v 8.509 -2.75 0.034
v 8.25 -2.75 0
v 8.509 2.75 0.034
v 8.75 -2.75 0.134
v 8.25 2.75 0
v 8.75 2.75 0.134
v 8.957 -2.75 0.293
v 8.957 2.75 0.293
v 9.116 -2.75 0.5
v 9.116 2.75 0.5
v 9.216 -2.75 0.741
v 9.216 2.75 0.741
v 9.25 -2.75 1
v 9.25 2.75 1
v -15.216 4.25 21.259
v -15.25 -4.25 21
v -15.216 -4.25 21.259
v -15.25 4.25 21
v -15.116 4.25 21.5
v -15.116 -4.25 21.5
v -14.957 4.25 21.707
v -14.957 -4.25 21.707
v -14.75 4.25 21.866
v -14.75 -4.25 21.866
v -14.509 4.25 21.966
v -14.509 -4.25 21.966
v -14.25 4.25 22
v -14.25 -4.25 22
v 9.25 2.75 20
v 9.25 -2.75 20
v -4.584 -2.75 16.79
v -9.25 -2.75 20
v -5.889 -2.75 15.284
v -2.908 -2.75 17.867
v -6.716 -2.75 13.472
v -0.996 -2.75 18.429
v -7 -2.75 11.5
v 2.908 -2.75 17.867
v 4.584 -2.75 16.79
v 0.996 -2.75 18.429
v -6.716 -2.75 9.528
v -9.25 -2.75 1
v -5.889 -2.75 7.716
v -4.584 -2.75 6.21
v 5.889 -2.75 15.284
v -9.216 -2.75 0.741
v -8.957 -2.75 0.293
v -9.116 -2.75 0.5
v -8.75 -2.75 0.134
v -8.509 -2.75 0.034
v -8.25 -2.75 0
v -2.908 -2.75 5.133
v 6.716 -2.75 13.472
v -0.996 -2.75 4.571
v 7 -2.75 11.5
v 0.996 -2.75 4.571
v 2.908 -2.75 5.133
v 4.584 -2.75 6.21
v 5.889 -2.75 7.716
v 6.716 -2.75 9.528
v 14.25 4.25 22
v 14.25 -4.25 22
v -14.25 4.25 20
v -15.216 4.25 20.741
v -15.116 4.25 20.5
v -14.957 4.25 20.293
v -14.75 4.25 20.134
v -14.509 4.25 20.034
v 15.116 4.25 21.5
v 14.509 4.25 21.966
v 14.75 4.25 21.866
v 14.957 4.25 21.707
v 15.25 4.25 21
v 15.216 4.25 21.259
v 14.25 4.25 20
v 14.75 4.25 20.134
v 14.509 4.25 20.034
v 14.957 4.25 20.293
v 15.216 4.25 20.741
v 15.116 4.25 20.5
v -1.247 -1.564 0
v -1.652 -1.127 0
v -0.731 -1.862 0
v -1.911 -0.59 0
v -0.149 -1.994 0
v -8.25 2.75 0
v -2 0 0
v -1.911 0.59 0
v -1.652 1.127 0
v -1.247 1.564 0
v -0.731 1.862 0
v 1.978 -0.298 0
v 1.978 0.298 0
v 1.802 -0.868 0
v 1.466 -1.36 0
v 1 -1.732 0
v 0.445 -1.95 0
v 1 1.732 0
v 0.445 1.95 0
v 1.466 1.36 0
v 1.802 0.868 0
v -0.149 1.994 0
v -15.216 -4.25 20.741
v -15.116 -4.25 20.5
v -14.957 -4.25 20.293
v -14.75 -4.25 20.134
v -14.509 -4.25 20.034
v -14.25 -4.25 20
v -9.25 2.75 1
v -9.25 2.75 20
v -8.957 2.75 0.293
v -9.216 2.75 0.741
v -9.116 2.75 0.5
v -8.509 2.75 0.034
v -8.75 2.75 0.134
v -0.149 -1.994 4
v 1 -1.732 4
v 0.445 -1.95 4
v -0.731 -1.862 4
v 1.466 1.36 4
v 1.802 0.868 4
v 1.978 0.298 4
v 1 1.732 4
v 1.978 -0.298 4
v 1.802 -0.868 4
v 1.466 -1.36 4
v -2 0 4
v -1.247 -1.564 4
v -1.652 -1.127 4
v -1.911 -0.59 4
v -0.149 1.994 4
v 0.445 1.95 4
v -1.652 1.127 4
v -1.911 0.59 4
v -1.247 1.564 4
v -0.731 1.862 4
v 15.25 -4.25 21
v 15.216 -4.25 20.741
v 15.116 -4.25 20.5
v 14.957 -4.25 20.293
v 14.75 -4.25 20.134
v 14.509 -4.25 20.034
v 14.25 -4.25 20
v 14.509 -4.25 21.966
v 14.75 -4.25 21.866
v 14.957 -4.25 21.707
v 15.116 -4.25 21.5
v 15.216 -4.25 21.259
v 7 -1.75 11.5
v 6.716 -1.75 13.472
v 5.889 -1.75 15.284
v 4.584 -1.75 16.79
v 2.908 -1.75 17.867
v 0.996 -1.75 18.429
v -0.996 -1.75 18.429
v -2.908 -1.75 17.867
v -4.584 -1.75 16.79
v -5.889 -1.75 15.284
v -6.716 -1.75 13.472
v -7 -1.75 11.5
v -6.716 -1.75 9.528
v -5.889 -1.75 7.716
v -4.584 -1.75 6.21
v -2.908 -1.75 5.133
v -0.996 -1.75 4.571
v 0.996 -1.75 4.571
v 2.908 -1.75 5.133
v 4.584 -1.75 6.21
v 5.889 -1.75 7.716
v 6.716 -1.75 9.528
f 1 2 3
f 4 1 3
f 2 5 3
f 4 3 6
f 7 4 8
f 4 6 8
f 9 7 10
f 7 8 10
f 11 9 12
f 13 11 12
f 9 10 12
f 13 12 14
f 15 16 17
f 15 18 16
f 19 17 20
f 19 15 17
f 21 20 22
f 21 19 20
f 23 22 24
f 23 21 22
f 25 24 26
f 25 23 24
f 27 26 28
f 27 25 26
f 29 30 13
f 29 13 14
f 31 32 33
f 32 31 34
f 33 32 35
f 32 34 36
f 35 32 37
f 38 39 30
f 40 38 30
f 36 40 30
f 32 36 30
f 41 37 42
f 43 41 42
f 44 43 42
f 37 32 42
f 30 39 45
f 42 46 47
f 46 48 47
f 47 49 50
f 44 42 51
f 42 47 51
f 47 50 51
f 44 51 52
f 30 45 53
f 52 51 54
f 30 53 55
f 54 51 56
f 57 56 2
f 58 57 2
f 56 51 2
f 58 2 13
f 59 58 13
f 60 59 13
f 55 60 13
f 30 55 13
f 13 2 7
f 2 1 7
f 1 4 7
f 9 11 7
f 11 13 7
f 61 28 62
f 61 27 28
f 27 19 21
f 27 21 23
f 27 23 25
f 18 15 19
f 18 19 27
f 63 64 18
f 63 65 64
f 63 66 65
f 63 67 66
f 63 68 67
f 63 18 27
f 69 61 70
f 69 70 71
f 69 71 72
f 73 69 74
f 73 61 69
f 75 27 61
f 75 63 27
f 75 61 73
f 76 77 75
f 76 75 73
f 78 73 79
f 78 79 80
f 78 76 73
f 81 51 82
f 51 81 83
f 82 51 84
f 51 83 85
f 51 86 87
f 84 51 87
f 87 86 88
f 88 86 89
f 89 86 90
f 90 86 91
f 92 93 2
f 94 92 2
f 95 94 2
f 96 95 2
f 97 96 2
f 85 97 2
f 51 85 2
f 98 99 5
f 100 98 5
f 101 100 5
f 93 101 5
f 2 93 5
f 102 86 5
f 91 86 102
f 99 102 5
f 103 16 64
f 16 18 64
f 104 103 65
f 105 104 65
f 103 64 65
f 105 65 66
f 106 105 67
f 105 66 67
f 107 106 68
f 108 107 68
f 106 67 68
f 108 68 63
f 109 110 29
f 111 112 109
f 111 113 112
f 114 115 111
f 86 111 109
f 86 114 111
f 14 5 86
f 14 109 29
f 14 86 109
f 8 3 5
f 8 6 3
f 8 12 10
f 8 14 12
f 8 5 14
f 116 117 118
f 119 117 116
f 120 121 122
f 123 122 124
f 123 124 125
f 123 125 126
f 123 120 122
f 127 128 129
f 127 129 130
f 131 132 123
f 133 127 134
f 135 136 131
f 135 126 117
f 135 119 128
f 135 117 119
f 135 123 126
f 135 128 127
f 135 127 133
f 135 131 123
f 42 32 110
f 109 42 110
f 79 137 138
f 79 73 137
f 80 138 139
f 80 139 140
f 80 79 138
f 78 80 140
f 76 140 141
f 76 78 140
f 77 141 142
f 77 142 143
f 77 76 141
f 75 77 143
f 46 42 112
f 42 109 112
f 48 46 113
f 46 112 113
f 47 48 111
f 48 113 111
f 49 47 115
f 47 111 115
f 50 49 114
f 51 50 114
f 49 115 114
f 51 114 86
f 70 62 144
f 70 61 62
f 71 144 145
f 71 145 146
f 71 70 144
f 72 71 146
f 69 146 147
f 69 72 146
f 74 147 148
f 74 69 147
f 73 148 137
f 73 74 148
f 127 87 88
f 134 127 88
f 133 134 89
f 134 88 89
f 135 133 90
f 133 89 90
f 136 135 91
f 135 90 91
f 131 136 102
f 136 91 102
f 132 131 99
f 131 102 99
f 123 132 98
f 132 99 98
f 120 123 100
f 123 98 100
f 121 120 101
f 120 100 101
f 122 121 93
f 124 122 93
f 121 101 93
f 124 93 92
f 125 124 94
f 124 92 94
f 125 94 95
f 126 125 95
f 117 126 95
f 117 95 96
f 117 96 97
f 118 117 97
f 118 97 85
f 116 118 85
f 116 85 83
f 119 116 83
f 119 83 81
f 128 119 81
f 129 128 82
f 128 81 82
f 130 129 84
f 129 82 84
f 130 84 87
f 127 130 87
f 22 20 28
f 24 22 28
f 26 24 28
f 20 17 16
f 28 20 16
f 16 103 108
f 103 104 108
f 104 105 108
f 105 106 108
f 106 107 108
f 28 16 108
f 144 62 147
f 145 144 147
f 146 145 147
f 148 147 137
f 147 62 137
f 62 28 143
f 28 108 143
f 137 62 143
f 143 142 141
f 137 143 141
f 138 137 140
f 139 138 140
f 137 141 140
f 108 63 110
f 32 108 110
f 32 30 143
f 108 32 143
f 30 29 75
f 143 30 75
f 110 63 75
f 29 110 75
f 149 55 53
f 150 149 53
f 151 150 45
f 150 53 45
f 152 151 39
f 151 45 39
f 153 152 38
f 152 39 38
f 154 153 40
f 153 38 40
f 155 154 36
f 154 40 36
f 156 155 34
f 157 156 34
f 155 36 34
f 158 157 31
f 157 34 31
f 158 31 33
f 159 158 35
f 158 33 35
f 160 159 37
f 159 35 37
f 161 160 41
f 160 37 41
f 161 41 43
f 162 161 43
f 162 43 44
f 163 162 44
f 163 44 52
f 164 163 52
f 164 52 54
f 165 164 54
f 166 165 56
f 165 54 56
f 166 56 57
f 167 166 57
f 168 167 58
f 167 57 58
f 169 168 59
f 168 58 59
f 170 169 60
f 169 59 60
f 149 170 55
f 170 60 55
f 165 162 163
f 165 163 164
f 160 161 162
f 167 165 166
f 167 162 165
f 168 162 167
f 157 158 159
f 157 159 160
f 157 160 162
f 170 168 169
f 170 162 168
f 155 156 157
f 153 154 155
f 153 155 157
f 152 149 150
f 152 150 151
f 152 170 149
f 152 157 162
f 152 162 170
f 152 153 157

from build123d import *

# Parameters (mm, degrees)
CROQUIS1_W              = 18.5
CROQUIS1_H              = 5.5
SALIENTE_EXTRUIR1_DEPTH = 20
CROQUIS4_R              = 7
CORTAR_EXTRUIR1_DEPTH   = 1
CROQUIS5_W              = 30.5
CROQUIS5_H              = 8.5
SALIENTE_EXTRUIR2_DEPTH = 2
REDONDEO2_R             = 1
REDONDEO3_R             = 1
REDONDEO4_R             = 1
REDONDEO5_R             = 1
CROQUIS6_R              = 2
CORTAR_EXTRUIR2_DEPTH   = 4
REDONDEO6_R             = 1
REDONDEO7_R             = 1


with BuildPart() as part:
    # Croquis1 → Saliente-Extruir1 (new body)
    with BuildSketch(Plane.XY):
        Rectangle(CROQUIS1_W, CROQUIS1_H)
    extrude(amount=SALIENTE_EXTRUIR1_DEPTH)

    # Croquis4 → Cortar-Extruir1 (cut)
    with BuildSketch(Plane.XZ.offset(2.75)):
        with Locations((0, 11.5)):
            Circle(CROQUIS4_R)
    extrude(amount=-CORTAR_EXTRUIR1_DEPTH, mode=Mode.SUBTRACT)

    # Croquis5 → Saliente-Extruir2 (add)
    with BuildSketch(Plane.XY.offset(20)):
        Rectangle(CROQUIS5_W, CROQUIS5_H)
    extrude(amount=SALIENTE_EXTRUIR2_DEPTH)

    # Redondeo2
    redondeo2_edges = [part.edges().sort_by_distance(p)[0] for p in [
        (-15.25, 0, 22),
    ]]
    fillet(redondeo2_edges, radius=REDONDEO2_R)

    # Redondeo3
    redondeo3_edges = [part.edges().sort_by_distance(p)[0] for p in [
        (-15.25, 0, 20),
    ]]
    fillet(redondeo3_edges, radius=REDONDEO3_R - 0.0001)  # a hair under: the kernel refuses the full size

    # Redondeo4
    redondeo4_edges = [part.edges().sort_by_distance(p)[0] for p in [
        (15.25, 0, 22),
    ]]
    fillet(redondeo4_edges, radius=REDONDEO4_R)

    # Redondeo5
    redondeo5_edges = [part.edges().sort_by_distance(p)[0] for p in [
        (15.25, 0, 20),
    ]]
    fillet(redondeo5_edges, radius=REDONDEO5_R - 0.0001)  # a hair under: the kernel refuses the full size

    # Croquis6 → Cortar-Extruir2 (cut)
    with BuildSketch(Plane(origin=(0, 0, 0), x_dir=(-1, 0, 0), z_dir=(0, 0, -1))):
        Circle(CROQUIS6_R)
    extrude(amount=-CORTAR_EXTRUIR2_DEPTH, mode=Mode.SUBTRACT)

    # Redondeo6
    redondeo6_edges = [part.edges().sort_by_distance(p)[0] for p in [
        (-9.25, 0, 0),
    ]]
    fillet(redondeo6_edges, radius=REDONDEO6_R)

    # Redondeo7
    redondeo7_edges = [part.edges().sort_by_distance(p)[0] for p in [
        (9.25, 0, 0),
    ]]
    fillet(redondeo7_edges, radius=REDONDEO7_R)


solid = part.part
